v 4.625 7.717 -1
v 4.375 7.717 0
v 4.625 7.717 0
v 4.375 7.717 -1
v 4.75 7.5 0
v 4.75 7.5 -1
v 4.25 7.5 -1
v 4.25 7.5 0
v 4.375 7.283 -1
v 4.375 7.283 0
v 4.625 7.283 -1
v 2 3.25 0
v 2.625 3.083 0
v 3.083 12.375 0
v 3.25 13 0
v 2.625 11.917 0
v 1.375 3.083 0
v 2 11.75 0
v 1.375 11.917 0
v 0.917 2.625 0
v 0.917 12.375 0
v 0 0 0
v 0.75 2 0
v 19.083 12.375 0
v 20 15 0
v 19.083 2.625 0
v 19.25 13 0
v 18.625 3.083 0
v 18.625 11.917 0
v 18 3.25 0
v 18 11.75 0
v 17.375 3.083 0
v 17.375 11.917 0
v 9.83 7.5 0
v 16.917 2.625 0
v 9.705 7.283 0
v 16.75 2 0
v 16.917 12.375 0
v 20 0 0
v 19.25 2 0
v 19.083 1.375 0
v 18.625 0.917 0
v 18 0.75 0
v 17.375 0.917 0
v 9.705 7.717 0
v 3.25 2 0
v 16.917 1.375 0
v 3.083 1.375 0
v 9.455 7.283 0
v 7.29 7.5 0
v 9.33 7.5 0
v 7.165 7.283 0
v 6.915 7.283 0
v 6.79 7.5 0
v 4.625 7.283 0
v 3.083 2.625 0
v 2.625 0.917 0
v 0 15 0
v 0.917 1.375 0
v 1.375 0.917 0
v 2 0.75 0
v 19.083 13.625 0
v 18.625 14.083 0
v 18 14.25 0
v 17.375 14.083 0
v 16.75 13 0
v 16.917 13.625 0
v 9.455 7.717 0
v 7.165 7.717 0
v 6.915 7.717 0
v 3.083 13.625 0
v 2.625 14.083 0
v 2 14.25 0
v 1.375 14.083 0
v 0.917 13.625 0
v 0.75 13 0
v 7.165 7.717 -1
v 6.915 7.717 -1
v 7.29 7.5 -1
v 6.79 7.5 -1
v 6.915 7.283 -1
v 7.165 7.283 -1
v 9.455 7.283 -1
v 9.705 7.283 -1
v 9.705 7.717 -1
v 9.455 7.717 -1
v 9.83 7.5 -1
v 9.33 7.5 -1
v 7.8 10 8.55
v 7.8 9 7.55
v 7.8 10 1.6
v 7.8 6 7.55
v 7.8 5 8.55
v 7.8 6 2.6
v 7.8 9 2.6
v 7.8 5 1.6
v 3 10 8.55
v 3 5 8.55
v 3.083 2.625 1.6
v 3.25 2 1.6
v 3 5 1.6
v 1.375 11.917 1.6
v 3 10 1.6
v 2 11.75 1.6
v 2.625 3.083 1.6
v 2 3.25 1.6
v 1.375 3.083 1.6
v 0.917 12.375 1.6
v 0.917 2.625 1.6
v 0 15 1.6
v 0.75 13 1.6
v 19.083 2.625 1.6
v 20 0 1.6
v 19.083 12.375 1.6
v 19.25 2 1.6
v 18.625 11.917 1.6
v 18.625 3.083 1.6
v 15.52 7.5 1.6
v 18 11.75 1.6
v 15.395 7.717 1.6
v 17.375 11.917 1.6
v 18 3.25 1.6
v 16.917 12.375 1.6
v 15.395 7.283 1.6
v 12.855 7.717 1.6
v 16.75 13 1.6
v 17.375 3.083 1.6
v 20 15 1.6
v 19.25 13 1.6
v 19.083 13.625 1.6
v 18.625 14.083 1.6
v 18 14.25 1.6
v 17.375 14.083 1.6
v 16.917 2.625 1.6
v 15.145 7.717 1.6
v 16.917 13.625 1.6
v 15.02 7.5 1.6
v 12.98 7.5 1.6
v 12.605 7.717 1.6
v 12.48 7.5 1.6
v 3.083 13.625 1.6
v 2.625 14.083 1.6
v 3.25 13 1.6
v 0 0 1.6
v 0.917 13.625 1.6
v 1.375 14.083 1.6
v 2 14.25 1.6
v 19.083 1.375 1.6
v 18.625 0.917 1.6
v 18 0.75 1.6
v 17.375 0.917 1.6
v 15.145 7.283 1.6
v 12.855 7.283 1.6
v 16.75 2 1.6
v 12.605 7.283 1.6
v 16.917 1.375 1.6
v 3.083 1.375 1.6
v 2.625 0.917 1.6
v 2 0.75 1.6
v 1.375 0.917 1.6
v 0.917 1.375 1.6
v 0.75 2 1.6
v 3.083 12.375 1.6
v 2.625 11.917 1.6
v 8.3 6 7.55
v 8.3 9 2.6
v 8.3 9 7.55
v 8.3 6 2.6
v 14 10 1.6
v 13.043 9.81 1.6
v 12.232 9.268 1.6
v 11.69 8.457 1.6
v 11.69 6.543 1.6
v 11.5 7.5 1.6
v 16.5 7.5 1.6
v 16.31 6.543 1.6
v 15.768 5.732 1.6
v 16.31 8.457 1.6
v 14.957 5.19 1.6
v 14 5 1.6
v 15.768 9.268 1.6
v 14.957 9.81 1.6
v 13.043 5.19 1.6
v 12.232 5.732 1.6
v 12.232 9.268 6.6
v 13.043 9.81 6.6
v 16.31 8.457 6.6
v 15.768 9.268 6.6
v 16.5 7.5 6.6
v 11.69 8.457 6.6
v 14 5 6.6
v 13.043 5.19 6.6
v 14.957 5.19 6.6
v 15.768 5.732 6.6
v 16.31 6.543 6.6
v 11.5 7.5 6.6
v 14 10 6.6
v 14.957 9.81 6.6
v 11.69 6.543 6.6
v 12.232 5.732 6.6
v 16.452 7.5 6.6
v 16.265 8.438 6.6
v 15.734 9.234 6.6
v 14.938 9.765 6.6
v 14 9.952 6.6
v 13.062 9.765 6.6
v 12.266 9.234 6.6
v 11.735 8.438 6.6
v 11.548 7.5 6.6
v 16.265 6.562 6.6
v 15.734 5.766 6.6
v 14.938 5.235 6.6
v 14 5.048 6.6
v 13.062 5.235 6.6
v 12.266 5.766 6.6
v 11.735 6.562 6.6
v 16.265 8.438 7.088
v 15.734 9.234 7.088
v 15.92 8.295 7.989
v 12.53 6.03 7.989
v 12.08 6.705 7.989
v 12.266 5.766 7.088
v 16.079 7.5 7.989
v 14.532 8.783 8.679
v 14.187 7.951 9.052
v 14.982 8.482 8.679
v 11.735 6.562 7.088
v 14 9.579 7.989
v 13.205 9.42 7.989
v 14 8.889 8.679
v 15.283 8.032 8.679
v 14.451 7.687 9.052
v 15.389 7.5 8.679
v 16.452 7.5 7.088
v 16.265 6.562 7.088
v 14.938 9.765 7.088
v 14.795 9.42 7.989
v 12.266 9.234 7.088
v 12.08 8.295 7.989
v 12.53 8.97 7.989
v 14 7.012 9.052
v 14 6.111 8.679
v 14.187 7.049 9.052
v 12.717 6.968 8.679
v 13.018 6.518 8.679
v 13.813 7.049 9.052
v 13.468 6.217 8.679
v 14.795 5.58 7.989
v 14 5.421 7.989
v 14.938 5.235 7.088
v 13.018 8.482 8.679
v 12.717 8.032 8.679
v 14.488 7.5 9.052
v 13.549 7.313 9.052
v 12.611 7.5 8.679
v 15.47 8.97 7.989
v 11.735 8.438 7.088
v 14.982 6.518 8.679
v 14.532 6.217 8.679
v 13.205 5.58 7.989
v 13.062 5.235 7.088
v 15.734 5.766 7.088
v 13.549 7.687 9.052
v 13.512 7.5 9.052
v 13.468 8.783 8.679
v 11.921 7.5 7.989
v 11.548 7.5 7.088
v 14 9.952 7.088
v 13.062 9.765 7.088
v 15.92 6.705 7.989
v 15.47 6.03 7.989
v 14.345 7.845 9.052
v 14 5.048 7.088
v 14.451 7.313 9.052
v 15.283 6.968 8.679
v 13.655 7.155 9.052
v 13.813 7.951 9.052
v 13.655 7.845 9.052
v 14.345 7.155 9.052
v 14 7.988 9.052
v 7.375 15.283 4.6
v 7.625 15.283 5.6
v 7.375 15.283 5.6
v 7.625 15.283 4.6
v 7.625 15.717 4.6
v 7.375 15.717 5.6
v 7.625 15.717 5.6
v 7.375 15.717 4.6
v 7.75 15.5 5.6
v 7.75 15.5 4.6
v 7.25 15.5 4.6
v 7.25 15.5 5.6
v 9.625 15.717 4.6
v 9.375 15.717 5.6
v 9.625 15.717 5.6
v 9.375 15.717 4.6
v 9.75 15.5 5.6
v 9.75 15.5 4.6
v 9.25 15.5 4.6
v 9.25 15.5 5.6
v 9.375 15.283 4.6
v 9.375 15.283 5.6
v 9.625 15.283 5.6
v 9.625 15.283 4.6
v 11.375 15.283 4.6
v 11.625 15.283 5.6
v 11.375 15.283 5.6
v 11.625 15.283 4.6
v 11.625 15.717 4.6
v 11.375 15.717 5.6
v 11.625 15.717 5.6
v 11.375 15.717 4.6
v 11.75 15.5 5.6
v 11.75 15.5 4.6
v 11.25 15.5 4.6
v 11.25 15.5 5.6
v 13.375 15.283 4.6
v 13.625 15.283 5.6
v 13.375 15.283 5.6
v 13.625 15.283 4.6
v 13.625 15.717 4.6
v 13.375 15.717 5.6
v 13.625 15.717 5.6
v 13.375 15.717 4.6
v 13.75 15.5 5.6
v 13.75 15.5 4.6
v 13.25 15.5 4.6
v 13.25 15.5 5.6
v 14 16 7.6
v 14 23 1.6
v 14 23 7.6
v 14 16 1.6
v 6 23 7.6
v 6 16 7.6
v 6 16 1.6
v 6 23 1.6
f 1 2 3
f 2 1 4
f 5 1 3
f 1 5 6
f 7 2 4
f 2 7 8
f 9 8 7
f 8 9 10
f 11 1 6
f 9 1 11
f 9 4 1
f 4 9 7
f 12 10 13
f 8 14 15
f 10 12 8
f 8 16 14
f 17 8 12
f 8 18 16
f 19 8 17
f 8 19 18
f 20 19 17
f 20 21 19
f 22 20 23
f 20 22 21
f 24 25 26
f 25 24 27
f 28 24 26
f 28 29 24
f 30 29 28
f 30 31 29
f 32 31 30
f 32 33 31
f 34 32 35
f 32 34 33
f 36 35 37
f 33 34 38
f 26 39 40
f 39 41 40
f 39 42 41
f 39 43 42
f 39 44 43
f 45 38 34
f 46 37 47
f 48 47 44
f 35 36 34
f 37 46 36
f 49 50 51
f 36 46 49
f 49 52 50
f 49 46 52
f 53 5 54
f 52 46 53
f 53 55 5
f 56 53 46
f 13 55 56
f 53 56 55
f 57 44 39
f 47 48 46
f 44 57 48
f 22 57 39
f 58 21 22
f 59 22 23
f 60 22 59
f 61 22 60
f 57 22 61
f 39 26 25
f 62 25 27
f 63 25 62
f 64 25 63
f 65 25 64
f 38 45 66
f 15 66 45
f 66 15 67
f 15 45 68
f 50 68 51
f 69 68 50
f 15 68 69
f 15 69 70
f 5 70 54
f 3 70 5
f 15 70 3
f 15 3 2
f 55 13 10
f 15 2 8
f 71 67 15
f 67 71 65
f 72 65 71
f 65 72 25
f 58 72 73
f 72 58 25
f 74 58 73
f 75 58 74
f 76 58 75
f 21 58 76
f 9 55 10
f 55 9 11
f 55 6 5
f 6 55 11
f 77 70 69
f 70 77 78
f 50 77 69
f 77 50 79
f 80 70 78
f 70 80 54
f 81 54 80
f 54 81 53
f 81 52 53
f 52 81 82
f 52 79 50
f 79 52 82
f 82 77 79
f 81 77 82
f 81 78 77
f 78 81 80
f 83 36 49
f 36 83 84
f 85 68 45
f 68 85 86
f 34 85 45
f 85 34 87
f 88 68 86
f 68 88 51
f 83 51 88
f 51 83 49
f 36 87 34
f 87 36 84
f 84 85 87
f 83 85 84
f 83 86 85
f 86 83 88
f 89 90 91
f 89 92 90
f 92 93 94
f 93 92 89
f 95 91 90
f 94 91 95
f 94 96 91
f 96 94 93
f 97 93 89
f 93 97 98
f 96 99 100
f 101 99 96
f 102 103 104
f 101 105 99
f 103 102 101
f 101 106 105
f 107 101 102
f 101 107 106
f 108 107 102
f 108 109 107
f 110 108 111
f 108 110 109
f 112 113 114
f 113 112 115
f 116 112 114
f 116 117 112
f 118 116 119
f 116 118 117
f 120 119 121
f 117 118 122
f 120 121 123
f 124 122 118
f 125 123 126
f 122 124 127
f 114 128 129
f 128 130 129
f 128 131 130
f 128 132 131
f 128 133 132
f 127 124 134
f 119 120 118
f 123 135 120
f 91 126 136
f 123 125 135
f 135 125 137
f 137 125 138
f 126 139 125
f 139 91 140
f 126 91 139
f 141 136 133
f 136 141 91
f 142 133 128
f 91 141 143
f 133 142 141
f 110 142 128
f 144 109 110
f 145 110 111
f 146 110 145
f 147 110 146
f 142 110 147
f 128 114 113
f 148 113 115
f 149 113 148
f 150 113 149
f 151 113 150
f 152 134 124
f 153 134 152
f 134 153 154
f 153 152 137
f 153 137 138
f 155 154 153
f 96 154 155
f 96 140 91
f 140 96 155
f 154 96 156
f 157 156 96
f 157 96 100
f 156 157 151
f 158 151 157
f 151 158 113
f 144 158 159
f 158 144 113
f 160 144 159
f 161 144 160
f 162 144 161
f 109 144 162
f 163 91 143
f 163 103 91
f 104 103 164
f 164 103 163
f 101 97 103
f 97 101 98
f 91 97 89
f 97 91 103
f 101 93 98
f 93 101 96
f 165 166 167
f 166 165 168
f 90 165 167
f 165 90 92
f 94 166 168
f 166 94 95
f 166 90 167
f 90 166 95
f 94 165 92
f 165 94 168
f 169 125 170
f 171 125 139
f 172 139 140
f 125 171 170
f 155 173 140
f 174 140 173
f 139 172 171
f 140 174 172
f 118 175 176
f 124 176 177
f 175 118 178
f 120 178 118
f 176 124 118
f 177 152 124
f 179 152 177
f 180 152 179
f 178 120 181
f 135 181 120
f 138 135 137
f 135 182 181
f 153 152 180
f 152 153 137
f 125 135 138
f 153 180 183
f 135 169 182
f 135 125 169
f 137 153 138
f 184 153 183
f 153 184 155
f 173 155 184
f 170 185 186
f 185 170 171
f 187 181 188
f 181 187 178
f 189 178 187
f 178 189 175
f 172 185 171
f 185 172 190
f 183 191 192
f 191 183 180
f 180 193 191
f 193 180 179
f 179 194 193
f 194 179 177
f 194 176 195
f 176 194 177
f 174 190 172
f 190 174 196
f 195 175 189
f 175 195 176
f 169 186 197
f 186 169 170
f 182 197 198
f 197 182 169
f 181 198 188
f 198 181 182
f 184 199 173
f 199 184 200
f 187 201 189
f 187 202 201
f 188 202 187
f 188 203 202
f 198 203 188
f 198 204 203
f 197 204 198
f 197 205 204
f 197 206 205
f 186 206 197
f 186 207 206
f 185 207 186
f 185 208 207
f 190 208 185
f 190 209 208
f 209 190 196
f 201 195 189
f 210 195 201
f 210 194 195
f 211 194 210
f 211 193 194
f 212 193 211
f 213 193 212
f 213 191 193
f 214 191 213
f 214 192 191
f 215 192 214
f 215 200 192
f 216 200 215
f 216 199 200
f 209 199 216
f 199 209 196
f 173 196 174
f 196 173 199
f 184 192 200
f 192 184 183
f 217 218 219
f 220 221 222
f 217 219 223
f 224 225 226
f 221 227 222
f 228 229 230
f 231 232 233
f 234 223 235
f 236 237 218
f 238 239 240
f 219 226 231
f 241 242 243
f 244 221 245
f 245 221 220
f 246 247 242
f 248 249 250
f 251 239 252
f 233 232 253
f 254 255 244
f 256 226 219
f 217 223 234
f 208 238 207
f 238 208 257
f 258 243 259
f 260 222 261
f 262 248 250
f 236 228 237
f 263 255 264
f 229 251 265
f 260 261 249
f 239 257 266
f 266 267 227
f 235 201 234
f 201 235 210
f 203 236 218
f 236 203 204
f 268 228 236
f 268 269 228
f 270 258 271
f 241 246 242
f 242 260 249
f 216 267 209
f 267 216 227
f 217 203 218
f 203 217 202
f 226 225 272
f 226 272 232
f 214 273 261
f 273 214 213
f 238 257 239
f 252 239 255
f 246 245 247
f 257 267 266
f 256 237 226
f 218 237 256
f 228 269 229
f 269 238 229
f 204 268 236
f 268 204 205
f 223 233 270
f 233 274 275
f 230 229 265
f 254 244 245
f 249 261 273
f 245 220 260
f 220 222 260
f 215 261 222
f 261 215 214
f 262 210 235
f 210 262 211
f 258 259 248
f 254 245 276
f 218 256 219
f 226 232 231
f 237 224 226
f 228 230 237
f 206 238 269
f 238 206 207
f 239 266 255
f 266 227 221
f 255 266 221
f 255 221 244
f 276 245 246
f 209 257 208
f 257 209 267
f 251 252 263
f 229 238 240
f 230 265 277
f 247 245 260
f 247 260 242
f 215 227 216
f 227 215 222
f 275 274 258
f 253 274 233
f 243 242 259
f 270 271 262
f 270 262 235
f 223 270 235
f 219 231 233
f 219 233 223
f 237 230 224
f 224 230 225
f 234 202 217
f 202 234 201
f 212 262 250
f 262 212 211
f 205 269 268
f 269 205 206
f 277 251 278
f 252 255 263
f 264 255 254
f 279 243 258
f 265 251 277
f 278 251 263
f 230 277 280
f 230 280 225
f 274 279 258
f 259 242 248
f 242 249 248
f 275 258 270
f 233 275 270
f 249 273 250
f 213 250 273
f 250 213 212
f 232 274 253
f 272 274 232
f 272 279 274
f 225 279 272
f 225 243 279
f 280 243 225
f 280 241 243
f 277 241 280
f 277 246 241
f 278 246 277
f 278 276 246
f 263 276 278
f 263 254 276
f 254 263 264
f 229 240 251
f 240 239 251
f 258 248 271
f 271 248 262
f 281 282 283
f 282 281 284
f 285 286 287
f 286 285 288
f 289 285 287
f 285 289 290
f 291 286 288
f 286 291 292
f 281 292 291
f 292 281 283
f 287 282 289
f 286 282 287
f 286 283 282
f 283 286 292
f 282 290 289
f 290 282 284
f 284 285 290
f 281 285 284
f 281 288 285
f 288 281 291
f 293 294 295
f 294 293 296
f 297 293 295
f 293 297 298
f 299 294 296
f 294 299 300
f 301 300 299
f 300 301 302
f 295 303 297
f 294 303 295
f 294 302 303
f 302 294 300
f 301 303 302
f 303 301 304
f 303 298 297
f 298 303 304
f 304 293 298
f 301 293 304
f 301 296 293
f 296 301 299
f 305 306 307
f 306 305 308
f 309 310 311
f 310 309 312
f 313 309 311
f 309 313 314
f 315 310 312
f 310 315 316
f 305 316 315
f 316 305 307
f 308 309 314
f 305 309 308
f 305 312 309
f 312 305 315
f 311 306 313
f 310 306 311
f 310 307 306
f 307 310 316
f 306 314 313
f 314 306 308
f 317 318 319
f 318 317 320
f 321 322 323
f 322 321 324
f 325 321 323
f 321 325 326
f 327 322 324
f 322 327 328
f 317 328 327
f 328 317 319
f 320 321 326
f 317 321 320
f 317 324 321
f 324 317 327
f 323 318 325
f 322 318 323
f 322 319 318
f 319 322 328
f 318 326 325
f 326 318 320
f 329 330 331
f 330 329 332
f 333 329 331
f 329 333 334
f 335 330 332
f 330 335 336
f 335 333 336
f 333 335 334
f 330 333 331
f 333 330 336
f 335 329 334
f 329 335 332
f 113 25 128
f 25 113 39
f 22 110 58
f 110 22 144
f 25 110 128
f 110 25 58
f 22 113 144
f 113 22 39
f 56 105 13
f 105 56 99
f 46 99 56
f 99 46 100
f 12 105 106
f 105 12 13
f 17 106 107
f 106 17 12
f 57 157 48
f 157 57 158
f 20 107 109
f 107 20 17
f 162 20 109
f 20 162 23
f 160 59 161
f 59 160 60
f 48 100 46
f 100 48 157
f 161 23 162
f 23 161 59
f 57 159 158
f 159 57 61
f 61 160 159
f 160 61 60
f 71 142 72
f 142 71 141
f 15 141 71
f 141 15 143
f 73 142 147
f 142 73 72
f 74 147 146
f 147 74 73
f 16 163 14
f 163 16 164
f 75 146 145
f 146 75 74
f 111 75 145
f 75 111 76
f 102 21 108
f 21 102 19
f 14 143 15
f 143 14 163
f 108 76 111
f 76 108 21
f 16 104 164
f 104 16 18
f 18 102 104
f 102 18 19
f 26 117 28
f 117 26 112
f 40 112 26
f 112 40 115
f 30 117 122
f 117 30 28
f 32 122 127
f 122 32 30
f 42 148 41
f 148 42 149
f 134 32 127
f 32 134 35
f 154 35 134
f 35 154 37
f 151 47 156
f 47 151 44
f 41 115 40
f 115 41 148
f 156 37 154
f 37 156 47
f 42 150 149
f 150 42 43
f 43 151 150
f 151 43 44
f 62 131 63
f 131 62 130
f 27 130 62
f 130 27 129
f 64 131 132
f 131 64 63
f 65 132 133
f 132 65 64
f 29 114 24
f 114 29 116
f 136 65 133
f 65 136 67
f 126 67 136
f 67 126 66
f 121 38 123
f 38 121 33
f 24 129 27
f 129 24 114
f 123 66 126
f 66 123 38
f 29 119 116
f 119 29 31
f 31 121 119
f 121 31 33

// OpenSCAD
// Wall Sensor PCB — TSOP38238 IR Receiver + 940nm IR LED
// BOM: custom PCB, ~$3 each, 2 units
//
// All dimensions (estimate) — this is a custom PCB, not an off-the-shelf
// module. The TSOP38238 and TSAL6100 (representative IR LED) have
// datasheet dimensions. The PCB layout is conjectural.
//
// Licensed CC0 — use freely.

// ===== PARAMETERS =====

// ---- Custom PCB (estimate) ----
pcb_l      = 20;   // mm (estimate: PCB length / width)
pcb_w      = 15;   // mm (estimate)
pcb_thick  =  1.6; // mm (estimate: standard FR4)

// ---- TSOP38238 (datasheet: Vishay TSOP382/384, Doc. 82491 rev 2.1, 27-May-2025, fetched 2026-08-15) ----
// NOTE 2026-08-15: envelope corrected to the official datasheet. Previous
// block read 6.0 x 5.0 x 4.0 mm (stale estimate) — the datasheet gives the
// Minicast package as "5.0 W x 6.95 H x 4.8 D" mm (overall with leads
// 8.25 ± 0.3; lead pitch 2.54 nom.; pinning 1 = OUT, 2 = GND, 3 = VS).
tsop_d     =  4.8; // mm (datasheet) package D — depth along boresight (X)
tsop_w     =  5.0; // mm (datasheet) package W (Y)
tsop_h     =  6.95; // mm (datasheet) package H total (leaded Minicast; overall
                    //  with leads 8.25 ± 0.3 mm)
tsop_pins  =  3;   // (datasheet: 1 = OUT, 2 = GND, 3 = VS)
tsop_pin_pitch = 2.54; // mm (datasheet) lead pitch "2.54 nom."

// ---- IR LED (Vishay TSAL6100 — representative, datasheet) ----
led_dia    =  5.0; // mm (datasheet: TSAL6100 5mm round LED — standard T1¾)
led_h      =  8.6; // mm (datasheet: total height from PCB including dome)
led_pitch  =  2.54; // mm (estimate: standard 0.1" lead spacing)
led_fwd_h  =  5.0; // mm (estimate: height of lens dome above PCB)

// ---- Mounting holes ----
mtg_dia    =  2.5; // mm (estimate: M2 screw clearance)
mtg_inset  =  2.0; // mm (estimate: hole center from board edge)

// ---- Cable / connector ----
conn_pins  =  4;   // (estimate: VCC, GND, TX_38kHz, RX_signal)
conn_pitch =  2.0; // mm (estimate: JST PH 2.0mm or similar)
conn_w     =  8;   // mm (estimate: connector width)
conn_d     =  7;   // mm (estimate: connector depth)
conn_h     =  6;   // mm (estimate: connector height above PCB)

$fn = 16;

// ===== MODULES =====

module pcb() {
    color("DarkGreen", 0.85) {
        translate([0, 0, 0])
            cube([pcb_l, pcb_w, pcb_thick]);
    }
}

module tsop38238() {
    // IR receiver module (3-pin)
    color("DimGray") {
        // Body
        translate([3, pcb_w/2 - tsop_w/2, pcb_thick])
            cube([tsop_d, tsop_w, tsop_h]);
        // IR window (front face)
        translate([3 + tsop_d, pcb_w/2 - tsop_w/2 + 1, pcb_thick + 1])
            color("DarkRed", 0.6)
                cube([0.5, tsop_w - 2, tsop_h - 2]);
        // Pins below PCB
        for (i = [0 : tsop_pins - 1]) {
            translate([4.5 + i * tsop_pin_pitch, pcb_w/2, -1])
                cylinder(h=1, d=0.5, $fn=6);
        }
    }
}

module ir_led() {
    // 5mm IR LED (940nm)
    color("DarkViolet", 0.7) {
        translate([pcb_l - 6, pcb_w/2, pcb_thick]) {
            // LED body below dome
            cylinder(h=led_fwd_h, d=led_dia);
            // Lens dome
            translate([0, 0, led_fwd_h])
                sphere(d=led_dia);
            // Leads
            for (dx = [-led_pitch/2, led_pitch/2]) {
                translate([dx, 0, -1])
                    cylinder(h=1, d=0.5, $fn=6);
            }
        }
    }
}

module connector() {
    // 4-pin JST PH or similar
    color("White") {
        translate([pcb_l/2 - conn_w/2, pcb_w + 1, pcb_thick])
            cube([conn_w, conn_d, conn_h]);
        // Pins inside connector
        for (i = [0 : conn_pins - 1]) {
            translate([pcb_l/2 - conn_w/2 + 1.5 + i * conn_pitch, pcb_w + 0.5, pcb_thick + conn_h/2])
                cylinder(h=1, d=0.5, $fn=6);
        }
    }
}

module mounting_holes() {
    // 4 corner mounting holes
    for (x = [mtg_inset, pcb_l - mtg_inset])
        for (y = [mtg_inset, pcb_w - mtg_inset])
            translate([x, y, -0.1])
                cylinder(h=pcb_thick + 0.2, d=mtg_dia, $fn=12);
}

module pcb_assembly() {
    difference() {
        union() {
            pcb();
            tsop38238();
            ir_led();
            connector();
        }
        mounting_holes();
    }
}

// ===== RENDER =====
pcb_assembly();

// ===== NOTES =====
// (1) Circuit: MCU GPIO → 38kHz PWM (50% duty) → NPN transistor →
//     IR LED (100mA pulsed). Reflection → TSOP38238 → active-low
//     output → MCU interrupt.
//
// (2) The TSOP38238 has AGC2 (long-burst) — must drive LED with
//     ≥10 continuous 38kHz cycles for reliable detection.
//
// (3) BOM calls for 2 wall sensor PCBs (left and right side). They
//     are mounted near the bumper, pointing sideways/forward for
//     wall following.
//
// (4) Premium alternative: replace the entire wall sensor with
//     VL53L7CX ToF for true distance measurement instead of binary
//     threshold.
